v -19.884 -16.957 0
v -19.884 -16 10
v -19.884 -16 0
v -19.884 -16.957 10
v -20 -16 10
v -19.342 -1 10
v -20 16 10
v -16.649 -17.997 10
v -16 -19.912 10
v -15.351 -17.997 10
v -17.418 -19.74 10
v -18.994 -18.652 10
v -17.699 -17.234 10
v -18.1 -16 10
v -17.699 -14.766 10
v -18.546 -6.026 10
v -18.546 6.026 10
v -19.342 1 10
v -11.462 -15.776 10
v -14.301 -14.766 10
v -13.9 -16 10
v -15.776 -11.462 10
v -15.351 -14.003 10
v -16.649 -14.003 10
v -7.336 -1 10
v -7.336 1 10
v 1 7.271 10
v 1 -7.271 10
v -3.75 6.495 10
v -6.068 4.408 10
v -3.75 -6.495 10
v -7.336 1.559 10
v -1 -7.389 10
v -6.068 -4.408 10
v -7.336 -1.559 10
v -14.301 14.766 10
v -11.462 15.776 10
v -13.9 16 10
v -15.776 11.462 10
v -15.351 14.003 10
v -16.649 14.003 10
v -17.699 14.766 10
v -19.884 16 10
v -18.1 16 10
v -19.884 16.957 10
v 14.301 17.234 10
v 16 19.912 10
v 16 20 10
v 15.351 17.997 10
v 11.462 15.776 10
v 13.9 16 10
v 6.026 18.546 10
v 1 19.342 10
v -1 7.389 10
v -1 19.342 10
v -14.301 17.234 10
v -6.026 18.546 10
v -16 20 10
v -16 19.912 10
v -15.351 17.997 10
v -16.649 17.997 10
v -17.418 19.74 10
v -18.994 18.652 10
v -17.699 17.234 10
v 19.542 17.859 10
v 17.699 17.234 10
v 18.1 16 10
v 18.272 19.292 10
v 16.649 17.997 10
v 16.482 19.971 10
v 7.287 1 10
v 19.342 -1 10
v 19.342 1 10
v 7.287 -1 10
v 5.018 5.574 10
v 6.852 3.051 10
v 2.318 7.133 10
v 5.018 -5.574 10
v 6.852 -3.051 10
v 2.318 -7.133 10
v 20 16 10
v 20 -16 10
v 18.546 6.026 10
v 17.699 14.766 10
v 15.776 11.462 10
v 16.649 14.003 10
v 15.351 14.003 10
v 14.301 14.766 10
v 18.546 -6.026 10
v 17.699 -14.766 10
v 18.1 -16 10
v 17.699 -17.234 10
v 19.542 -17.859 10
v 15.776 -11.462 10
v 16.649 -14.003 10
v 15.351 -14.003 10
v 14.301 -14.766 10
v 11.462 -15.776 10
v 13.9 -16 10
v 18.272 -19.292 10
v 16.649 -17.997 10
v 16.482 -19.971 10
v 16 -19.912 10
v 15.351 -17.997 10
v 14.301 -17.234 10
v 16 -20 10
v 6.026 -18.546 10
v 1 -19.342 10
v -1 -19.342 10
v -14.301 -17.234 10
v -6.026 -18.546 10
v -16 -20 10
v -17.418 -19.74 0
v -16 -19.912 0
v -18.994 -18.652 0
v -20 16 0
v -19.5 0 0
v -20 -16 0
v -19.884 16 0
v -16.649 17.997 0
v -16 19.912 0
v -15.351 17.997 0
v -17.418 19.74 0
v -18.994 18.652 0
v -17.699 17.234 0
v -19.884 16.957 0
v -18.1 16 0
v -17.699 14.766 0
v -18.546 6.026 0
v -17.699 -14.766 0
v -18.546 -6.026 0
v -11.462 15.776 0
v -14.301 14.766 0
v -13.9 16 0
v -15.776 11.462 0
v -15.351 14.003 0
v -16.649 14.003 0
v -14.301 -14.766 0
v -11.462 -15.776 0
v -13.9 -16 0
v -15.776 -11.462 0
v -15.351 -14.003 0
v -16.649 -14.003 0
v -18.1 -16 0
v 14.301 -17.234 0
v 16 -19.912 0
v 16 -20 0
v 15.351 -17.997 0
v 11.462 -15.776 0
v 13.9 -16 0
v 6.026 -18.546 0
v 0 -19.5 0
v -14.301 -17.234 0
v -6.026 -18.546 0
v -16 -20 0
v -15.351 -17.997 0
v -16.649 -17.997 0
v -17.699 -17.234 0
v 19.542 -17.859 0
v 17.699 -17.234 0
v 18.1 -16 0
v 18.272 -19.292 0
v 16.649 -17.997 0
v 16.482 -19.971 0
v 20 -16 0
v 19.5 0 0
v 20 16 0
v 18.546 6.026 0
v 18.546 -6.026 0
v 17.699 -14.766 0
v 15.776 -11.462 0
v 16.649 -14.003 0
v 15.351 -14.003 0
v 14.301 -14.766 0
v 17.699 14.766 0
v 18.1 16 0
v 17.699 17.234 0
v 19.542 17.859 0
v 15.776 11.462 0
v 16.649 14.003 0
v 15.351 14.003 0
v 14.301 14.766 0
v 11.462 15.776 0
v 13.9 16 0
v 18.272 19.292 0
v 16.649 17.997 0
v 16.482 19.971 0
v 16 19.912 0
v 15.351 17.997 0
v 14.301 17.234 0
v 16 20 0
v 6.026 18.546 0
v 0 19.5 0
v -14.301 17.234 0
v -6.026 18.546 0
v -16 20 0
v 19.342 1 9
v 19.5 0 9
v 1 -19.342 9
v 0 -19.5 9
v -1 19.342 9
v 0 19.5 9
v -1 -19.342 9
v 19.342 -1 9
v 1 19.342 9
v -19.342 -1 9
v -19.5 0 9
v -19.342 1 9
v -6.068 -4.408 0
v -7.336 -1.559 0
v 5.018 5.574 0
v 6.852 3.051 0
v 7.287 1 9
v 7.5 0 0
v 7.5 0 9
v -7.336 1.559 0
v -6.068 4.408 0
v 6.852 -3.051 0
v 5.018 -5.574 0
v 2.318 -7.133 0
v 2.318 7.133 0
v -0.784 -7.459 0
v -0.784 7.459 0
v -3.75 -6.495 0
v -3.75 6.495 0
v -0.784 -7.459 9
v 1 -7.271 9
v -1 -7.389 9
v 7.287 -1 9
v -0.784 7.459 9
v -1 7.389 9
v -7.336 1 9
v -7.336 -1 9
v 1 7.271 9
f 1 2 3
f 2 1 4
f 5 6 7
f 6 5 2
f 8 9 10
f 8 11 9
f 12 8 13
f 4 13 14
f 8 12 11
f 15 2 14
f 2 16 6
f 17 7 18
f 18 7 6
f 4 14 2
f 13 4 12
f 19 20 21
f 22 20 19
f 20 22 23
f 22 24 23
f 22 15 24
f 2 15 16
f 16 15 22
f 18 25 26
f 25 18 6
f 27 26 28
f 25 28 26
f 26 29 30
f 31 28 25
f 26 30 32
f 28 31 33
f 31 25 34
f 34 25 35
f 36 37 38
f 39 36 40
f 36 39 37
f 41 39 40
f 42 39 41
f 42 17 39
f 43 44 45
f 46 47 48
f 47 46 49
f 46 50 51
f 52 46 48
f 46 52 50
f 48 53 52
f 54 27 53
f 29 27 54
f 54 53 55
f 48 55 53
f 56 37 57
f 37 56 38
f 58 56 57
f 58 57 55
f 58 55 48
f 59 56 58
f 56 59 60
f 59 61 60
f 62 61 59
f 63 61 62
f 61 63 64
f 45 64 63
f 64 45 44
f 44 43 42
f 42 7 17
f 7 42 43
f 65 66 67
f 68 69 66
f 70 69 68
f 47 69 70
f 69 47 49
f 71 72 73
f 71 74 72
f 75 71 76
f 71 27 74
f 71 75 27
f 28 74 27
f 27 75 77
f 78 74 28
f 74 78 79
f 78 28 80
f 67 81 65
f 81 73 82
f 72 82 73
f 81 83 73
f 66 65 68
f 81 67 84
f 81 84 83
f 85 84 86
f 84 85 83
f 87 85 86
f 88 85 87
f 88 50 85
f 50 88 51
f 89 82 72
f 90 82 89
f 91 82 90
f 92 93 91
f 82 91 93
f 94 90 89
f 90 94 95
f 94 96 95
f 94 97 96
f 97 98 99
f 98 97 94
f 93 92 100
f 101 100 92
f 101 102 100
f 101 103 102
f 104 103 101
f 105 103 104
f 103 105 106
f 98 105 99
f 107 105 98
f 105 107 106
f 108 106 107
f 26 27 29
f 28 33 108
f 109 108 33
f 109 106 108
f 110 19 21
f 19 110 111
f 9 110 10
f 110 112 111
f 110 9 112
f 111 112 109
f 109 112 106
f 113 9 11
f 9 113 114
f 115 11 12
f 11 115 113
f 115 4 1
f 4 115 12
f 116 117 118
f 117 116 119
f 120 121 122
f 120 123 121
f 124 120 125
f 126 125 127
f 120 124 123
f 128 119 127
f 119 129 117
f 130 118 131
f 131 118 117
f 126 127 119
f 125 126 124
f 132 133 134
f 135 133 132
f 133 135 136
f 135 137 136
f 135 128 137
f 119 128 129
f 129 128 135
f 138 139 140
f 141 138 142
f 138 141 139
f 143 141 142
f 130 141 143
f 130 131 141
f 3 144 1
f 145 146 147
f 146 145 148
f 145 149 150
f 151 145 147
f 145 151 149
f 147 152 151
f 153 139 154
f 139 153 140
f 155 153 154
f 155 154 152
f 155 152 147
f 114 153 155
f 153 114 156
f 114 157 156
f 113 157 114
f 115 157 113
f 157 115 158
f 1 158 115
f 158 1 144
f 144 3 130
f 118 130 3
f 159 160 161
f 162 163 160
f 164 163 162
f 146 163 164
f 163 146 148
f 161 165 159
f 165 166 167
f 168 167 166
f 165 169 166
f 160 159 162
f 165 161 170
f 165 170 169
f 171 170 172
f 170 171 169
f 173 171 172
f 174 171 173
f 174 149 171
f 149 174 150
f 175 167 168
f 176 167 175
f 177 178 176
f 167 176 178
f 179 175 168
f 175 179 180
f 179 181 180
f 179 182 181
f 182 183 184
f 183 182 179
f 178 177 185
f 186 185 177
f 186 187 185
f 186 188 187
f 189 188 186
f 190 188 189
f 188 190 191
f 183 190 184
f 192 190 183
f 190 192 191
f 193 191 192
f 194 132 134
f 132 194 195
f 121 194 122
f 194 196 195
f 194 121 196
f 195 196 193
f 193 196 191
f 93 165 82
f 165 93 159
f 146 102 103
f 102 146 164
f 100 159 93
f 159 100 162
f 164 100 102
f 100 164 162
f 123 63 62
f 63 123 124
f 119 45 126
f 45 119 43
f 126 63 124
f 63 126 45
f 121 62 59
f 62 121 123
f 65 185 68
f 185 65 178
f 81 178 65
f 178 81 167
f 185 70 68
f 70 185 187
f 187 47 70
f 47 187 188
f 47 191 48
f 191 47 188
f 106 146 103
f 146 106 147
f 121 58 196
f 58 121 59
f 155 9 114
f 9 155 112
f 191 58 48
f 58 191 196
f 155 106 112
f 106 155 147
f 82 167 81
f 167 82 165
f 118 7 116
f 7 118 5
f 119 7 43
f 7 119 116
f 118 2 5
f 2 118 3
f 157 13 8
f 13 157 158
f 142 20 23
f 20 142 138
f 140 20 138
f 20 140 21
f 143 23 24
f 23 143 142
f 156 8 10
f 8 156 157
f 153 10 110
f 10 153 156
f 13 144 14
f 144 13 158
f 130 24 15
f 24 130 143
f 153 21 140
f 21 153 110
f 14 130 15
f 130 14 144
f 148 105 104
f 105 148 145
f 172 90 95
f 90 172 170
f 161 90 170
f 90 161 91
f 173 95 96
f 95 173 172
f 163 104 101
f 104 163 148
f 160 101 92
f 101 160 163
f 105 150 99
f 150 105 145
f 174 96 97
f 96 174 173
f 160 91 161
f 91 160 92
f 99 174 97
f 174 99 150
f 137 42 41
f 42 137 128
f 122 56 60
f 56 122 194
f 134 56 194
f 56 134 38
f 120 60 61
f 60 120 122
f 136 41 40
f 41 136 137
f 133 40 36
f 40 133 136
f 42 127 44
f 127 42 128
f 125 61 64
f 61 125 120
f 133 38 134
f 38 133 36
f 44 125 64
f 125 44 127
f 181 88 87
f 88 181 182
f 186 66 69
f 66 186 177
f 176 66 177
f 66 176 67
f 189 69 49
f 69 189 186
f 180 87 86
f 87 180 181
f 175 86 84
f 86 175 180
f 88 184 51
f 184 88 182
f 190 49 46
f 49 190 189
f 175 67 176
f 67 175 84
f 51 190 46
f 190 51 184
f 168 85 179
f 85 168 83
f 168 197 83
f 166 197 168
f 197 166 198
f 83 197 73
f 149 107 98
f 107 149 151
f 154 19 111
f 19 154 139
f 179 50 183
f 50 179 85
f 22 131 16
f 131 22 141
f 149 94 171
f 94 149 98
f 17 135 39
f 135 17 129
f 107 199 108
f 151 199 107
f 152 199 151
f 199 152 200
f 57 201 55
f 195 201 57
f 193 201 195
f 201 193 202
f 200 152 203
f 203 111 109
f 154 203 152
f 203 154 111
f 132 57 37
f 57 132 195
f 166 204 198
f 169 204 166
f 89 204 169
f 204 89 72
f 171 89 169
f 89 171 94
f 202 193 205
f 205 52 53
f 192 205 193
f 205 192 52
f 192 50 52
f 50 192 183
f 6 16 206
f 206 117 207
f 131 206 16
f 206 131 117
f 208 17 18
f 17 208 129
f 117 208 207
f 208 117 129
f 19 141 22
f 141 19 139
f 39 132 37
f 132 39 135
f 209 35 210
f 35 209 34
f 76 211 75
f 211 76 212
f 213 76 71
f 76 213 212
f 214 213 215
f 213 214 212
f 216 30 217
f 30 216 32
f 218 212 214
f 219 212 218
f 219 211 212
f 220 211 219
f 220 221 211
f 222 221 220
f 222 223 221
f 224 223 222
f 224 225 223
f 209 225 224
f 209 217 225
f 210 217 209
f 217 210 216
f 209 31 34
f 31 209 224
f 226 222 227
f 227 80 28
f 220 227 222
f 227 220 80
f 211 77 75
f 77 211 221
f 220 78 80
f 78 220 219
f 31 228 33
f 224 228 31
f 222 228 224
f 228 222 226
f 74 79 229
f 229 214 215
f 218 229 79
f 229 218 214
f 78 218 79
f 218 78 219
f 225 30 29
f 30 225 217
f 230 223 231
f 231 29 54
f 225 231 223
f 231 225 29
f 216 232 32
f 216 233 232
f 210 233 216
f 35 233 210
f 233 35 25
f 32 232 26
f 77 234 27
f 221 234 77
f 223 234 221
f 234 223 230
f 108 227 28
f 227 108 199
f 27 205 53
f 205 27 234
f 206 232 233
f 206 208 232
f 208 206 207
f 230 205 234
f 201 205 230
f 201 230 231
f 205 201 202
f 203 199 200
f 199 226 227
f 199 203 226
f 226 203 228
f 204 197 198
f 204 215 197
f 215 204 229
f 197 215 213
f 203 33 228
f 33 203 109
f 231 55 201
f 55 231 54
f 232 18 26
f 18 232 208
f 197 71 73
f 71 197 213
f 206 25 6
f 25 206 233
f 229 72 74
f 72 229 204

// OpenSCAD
module fan40x40() {
    translate([-20, -20, 0])
    union() {
        difference() {
            union() {
                translate([4, 4, 0])   cylinder(r = 4, h = 10);
                translate([36, 4, 0])  cylinder(r = 4, h = 10);
                translate([4, 36, 0])  cylinder(r = 4, h = 10);
                translate([36, 36, 0]) cylinder(r = 4, h = 10);
                translate([4, 0, 0]) cube([32, 40, 10]);
                translate([0, 4, 0]) cube([40, 32, 10]);
            };
            union() {
                translate([4, 4, -2])   cylinder(d = 4.2, h = 20, $fn=10);
                translate([36, 4, -2])  cylinder(d = 4.2, h = 20, $fn=10);
                translate([4, 36, -2])  cylinder(d = 4.2, h = 20, $fn=10);
                translate([36, 36, -2]) cylinder(d = 4.2, h = 20, $fn=10);
                translate([20, 20, -2]) cylinder(d = 39, h = 20, $fn=20);
            };
        }
        translate([20, 20, 0]) cylinder(d=15, h=10, $fn=15);

        translate([20, 20, 9.5]) cube([2, 40, 1], center=true);
        translate([20, 20, 9.5]) cube([40, 2, 1], center=true);
    }
}

fan40x40();
